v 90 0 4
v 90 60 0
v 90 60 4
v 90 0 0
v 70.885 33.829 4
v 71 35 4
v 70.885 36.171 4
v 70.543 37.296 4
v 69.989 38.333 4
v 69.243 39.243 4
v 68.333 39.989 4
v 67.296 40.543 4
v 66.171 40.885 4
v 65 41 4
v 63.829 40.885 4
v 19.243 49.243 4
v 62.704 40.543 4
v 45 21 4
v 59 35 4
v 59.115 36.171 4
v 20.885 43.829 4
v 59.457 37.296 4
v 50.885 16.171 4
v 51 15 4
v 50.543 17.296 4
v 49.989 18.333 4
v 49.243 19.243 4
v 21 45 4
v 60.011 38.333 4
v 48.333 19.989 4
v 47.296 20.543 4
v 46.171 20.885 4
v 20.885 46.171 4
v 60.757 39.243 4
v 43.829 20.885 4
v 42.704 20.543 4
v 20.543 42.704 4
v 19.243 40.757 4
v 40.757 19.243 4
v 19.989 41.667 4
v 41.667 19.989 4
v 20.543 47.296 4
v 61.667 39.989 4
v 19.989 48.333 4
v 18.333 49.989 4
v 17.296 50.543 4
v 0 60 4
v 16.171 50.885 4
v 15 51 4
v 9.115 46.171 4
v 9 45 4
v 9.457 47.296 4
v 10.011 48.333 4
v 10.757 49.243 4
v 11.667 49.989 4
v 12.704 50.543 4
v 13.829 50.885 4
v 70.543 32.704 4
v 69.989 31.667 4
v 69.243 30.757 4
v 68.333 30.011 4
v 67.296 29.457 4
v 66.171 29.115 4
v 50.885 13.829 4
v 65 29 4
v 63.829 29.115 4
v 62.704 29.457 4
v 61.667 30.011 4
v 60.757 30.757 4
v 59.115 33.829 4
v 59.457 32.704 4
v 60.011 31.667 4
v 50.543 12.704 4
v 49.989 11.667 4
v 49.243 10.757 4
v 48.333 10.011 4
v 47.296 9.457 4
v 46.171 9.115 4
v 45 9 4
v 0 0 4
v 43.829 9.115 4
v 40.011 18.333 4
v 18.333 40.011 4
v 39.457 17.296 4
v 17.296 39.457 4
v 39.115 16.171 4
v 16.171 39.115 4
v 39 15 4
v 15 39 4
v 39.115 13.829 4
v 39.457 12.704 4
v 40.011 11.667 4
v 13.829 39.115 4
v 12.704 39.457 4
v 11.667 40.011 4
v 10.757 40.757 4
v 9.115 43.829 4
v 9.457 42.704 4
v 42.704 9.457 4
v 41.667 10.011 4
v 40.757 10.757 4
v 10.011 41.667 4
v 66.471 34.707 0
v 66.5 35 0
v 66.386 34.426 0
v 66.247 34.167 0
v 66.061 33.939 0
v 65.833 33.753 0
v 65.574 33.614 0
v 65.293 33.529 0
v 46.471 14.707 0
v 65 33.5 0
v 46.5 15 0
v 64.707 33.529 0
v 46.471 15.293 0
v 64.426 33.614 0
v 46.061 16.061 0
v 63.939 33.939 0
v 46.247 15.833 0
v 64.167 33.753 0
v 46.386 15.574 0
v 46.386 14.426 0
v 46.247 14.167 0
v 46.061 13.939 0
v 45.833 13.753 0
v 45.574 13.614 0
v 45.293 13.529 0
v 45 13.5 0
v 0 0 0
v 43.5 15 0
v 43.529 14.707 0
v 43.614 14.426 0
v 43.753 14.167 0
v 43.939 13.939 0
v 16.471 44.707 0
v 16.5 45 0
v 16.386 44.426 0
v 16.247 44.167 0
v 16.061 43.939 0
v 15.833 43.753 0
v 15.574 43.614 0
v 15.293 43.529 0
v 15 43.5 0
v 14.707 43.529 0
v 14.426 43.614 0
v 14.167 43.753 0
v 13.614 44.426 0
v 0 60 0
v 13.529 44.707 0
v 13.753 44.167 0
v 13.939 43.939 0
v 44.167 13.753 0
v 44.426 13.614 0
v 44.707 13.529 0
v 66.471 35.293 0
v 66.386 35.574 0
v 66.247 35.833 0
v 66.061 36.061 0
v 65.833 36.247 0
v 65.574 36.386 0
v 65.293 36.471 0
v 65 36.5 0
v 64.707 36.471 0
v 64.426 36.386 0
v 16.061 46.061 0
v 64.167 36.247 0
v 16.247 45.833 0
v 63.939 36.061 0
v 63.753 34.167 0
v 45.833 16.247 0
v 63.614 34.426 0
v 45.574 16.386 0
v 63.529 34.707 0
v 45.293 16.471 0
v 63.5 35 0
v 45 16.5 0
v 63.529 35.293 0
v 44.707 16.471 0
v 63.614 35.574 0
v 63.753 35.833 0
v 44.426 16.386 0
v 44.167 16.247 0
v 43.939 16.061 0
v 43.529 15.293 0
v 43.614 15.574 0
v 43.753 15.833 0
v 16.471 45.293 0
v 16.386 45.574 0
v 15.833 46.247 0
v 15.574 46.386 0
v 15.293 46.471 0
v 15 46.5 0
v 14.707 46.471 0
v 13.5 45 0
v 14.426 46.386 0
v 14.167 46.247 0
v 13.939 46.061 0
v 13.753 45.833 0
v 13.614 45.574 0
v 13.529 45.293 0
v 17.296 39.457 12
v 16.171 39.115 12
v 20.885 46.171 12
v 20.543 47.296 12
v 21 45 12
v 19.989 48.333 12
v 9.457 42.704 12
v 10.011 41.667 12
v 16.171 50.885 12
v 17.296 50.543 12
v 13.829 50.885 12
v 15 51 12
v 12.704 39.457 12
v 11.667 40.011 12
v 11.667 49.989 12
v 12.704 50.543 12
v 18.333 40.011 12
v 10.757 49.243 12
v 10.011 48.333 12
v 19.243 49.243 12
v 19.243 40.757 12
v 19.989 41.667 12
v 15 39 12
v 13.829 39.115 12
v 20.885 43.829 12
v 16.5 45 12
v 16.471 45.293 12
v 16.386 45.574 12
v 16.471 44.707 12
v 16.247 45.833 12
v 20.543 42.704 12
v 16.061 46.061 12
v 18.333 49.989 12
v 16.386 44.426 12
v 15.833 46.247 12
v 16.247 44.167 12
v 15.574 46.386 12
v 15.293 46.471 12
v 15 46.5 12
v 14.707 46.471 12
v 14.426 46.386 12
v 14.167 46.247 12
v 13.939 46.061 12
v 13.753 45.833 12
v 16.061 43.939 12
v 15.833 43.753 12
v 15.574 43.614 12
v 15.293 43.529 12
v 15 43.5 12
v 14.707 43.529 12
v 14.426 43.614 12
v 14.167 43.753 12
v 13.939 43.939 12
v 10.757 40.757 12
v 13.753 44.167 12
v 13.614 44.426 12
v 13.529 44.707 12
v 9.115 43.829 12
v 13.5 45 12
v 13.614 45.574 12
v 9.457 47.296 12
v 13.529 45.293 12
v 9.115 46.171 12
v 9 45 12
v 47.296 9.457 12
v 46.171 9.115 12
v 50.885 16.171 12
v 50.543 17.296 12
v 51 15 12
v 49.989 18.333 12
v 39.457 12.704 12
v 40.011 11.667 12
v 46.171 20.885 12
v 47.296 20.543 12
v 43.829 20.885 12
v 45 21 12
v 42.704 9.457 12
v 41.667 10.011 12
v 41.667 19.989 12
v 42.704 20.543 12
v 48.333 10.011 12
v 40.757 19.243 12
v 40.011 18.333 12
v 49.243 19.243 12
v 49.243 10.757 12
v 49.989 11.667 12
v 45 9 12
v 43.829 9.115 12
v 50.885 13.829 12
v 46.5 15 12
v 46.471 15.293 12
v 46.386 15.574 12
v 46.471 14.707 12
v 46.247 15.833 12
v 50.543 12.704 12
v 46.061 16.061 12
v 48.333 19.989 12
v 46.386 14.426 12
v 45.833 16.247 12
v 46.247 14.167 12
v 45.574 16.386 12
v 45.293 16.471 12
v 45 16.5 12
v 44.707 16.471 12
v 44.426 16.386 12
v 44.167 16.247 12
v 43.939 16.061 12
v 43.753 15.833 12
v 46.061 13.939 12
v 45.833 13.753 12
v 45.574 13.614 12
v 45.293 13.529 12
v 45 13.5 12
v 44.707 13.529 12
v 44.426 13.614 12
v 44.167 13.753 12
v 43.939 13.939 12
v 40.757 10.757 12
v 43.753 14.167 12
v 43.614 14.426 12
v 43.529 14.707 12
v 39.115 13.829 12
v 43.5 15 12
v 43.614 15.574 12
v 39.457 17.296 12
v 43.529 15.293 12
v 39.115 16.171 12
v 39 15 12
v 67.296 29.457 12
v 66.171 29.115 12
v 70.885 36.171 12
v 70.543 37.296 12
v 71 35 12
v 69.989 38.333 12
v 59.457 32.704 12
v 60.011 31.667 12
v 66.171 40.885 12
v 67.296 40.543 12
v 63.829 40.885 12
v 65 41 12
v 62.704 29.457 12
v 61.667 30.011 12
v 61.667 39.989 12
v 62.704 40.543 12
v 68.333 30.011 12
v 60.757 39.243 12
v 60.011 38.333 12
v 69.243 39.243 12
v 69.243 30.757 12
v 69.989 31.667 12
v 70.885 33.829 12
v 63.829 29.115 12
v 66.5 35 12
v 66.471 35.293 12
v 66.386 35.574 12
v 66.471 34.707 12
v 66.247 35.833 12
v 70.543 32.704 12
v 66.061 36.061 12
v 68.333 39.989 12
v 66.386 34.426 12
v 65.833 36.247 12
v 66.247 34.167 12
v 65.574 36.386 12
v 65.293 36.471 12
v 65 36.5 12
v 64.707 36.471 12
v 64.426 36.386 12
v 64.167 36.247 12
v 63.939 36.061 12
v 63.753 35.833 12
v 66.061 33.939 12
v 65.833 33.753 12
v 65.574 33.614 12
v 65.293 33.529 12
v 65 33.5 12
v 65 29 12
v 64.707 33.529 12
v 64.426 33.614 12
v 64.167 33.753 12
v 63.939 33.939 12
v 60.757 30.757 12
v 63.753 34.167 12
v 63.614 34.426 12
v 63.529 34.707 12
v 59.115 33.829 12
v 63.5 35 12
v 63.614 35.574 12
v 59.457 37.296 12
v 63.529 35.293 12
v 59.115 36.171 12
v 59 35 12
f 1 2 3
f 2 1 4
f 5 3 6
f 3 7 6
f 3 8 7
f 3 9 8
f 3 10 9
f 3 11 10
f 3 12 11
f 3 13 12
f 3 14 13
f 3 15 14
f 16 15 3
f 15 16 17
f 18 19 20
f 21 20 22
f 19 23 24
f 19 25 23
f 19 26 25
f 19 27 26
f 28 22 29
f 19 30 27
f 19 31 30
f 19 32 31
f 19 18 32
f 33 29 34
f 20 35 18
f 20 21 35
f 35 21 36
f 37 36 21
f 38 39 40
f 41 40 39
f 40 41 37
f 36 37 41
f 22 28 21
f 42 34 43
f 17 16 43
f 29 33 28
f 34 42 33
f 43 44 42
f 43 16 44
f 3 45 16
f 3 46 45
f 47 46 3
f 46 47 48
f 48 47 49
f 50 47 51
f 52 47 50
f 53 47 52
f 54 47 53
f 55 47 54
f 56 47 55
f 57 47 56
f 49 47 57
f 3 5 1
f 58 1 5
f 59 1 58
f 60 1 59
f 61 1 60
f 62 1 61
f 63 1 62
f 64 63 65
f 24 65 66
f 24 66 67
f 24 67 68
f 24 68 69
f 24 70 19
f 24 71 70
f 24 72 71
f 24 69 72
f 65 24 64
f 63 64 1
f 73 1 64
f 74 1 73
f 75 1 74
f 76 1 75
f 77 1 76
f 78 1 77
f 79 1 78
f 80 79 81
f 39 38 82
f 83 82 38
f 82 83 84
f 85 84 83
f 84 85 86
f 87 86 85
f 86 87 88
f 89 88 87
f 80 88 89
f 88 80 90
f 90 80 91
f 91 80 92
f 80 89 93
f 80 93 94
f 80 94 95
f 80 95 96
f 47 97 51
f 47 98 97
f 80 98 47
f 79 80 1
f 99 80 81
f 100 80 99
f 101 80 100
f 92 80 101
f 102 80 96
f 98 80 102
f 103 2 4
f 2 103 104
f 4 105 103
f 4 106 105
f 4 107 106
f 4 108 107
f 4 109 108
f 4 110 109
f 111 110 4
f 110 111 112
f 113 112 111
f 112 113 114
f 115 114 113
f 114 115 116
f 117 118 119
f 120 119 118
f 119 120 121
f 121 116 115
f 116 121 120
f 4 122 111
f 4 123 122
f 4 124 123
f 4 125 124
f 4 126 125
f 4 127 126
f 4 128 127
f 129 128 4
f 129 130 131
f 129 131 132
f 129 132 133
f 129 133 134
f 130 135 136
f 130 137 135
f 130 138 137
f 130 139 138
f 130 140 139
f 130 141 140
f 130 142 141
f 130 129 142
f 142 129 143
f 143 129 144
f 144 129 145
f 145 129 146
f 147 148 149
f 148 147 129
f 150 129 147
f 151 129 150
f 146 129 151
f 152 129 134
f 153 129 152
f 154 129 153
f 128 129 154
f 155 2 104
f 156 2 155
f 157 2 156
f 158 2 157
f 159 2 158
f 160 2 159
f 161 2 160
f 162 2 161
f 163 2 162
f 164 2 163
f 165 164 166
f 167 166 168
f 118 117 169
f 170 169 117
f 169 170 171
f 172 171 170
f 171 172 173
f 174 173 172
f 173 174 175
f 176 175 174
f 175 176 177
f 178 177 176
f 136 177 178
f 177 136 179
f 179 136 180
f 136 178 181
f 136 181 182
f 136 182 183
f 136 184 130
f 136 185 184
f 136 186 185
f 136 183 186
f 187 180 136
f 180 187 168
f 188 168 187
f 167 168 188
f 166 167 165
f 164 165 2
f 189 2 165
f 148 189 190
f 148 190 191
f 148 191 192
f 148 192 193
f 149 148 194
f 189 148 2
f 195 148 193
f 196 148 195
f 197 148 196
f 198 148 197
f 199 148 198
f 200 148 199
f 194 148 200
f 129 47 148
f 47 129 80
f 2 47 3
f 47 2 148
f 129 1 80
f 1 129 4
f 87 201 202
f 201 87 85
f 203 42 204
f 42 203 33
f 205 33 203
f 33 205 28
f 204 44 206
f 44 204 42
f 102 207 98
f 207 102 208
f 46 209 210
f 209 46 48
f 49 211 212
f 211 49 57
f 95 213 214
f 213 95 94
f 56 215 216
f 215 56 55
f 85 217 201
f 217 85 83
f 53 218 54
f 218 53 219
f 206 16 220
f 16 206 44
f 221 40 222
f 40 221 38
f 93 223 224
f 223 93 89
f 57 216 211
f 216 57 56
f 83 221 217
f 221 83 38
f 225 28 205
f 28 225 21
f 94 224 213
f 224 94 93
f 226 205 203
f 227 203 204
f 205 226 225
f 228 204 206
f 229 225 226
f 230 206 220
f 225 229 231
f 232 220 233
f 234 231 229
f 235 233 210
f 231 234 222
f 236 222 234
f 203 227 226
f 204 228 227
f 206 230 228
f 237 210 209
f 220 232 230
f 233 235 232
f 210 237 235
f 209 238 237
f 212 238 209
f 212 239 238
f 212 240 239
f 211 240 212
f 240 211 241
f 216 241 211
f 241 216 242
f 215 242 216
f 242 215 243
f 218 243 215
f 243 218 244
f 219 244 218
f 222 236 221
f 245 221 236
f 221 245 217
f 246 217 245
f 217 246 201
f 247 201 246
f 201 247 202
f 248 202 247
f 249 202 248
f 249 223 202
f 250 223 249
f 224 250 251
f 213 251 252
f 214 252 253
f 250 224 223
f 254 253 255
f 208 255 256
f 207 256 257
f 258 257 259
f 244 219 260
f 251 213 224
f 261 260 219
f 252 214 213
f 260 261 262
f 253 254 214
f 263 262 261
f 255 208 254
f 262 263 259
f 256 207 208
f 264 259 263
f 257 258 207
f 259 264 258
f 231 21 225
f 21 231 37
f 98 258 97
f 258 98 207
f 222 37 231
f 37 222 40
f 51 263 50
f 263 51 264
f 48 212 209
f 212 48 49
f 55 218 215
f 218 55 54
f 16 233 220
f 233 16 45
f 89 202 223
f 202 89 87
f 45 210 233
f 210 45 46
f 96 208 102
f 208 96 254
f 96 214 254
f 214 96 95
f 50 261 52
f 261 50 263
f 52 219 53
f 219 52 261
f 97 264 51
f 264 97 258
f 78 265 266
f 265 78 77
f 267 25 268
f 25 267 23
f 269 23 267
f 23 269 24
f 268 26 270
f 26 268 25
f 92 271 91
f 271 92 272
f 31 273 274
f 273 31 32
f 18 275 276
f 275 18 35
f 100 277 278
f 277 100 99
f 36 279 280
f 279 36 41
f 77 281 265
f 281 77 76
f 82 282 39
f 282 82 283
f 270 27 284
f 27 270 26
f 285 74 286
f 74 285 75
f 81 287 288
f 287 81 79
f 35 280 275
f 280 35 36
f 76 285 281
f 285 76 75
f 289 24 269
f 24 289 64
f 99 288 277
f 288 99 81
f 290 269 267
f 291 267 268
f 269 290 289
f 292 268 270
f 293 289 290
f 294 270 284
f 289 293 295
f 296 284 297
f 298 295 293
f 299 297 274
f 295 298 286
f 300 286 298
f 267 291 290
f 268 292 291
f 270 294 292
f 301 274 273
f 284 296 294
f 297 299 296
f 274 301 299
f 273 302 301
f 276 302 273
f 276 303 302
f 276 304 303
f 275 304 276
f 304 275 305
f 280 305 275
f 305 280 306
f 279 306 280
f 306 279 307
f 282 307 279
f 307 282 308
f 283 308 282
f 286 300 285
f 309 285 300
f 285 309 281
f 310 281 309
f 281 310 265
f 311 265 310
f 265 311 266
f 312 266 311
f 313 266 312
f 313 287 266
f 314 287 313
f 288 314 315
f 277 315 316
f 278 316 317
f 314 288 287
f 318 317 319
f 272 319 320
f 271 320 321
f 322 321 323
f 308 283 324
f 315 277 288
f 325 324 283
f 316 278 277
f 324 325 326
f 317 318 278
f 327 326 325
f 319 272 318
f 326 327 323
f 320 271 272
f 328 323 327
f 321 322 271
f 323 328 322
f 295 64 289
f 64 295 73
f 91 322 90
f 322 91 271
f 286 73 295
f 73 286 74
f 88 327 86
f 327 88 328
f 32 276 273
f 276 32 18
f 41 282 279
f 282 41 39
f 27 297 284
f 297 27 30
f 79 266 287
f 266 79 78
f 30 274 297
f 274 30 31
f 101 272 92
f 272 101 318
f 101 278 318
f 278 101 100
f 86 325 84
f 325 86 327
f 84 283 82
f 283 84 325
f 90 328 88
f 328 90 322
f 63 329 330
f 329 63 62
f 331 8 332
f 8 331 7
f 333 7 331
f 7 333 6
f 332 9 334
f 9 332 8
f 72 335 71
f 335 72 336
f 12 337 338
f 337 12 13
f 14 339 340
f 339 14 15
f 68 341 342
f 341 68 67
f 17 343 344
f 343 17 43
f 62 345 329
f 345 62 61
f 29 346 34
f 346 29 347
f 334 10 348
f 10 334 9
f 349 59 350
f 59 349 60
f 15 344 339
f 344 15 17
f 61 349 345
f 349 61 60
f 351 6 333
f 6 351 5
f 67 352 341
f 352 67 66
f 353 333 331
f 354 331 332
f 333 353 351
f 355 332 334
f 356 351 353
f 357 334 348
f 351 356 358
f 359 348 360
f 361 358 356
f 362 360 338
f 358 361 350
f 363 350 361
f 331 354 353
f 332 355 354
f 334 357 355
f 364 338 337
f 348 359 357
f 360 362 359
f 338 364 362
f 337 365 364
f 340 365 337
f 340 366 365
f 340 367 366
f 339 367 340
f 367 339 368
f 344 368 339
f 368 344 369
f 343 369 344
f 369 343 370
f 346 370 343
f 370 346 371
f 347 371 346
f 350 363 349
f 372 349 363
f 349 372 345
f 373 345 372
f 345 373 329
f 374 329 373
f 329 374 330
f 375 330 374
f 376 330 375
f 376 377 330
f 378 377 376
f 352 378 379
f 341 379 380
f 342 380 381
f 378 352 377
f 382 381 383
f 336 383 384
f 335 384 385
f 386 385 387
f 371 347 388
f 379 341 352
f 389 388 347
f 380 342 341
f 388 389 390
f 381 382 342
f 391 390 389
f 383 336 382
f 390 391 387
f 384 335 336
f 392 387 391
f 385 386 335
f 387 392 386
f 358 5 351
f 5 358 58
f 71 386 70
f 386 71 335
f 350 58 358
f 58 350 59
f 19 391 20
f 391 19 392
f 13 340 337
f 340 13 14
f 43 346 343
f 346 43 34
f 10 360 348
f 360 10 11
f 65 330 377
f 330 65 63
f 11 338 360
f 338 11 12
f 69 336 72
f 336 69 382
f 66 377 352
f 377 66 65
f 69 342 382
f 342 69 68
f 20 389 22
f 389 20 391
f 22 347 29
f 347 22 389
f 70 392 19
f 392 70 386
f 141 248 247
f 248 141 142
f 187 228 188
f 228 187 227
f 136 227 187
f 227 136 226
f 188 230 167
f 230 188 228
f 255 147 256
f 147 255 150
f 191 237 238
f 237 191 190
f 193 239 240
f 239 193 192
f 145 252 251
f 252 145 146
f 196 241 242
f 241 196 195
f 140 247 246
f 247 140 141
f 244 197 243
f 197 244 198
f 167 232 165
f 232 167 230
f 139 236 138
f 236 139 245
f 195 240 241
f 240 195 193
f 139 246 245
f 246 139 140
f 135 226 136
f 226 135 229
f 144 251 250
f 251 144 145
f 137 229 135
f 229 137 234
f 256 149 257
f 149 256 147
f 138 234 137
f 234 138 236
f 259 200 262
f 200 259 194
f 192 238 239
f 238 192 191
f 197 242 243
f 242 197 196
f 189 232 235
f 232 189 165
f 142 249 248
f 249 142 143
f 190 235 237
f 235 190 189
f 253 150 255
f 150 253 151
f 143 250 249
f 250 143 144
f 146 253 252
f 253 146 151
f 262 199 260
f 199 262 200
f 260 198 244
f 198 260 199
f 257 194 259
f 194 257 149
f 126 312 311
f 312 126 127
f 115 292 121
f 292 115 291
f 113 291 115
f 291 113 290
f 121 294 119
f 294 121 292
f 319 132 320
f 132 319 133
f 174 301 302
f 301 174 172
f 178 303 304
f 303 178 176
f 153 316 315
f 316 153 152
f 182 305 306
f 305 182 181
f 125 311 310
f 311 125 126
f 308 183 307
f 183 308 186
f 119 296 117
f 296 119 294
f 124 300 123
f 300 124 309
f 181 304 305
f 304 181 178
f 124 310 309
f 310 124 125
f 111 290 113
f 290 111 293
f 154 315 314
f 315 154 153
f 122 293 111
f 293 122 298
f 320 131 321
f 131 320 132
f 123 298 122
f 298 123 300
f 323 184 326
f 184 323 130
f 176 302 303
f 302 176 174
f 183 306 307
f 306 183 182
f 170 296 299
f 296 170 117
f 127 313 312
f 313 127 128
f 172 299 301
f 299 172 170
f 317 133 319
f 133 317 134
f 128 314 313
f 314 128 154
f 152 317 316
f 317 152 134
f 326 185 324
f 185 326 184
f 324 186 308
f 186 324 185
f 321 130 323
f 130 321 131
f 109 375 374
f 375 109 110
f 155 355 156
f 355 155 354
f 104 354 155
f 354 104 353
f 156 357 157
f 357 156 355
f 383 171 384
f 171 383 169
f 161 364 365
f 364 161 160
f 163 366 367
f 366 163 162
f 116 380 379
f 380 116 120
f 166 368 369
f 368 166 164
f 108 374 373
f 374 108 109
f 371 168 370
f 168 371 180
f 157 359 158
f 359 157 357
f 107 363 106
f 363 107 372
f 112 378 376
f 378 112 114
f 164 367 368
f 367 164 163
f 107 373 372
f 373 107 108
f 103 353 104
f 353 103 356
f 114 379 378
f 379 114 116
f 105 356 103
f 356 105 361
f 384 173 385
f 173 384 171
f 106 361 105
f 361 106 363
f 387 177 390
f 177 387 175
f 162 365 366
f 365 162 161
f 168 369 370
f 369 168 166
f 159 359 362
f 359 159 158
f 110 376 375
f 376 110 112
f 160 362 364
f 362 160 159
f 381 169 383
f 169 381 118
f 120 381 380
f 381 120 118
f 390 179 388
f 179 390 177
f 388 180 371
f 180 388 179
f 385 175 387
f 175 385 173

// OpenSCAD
$fn = 32;

// ----------------------------------------------------------------------
// Boss field: plate with bosses at given coordinates
// ----------------------------------------------------------------------

// --- parameters (mm) ---
plate_l = 90;             // plate length, X
plate_w = 60;             // plate width, Y
plate_t = 4;              // plate thickness, Z
boss_d = 12;              // boss diameter
boss_h = 8;               // boss height above the plate
bore_d = 3;               // boss bore

total_h = plate_t + boss_h;  // overall height

difference() {
  union() {
    cube([plate_l, plate_w, plate_t]);
    translate([15, 45, plate_t]) cylinder(h = boss_h, d = boss_d);
    translate([45, 15, plate_t]) cylinder(h = boss_h, d = boss_d);
    translate([65, 35, plate_t]) cylinder(h = boss_h, d = boss_d);
  }
  translate([15, 45, -1]) cylinder(h = total_h + 2, d = bore_d);
  translate([45, 15, -1]) cylinder(h = total_h + 2, d = bore_d);
  translate([65, 35, -1]) cylinder(h = total_h + 2, d = bore_d);
}
